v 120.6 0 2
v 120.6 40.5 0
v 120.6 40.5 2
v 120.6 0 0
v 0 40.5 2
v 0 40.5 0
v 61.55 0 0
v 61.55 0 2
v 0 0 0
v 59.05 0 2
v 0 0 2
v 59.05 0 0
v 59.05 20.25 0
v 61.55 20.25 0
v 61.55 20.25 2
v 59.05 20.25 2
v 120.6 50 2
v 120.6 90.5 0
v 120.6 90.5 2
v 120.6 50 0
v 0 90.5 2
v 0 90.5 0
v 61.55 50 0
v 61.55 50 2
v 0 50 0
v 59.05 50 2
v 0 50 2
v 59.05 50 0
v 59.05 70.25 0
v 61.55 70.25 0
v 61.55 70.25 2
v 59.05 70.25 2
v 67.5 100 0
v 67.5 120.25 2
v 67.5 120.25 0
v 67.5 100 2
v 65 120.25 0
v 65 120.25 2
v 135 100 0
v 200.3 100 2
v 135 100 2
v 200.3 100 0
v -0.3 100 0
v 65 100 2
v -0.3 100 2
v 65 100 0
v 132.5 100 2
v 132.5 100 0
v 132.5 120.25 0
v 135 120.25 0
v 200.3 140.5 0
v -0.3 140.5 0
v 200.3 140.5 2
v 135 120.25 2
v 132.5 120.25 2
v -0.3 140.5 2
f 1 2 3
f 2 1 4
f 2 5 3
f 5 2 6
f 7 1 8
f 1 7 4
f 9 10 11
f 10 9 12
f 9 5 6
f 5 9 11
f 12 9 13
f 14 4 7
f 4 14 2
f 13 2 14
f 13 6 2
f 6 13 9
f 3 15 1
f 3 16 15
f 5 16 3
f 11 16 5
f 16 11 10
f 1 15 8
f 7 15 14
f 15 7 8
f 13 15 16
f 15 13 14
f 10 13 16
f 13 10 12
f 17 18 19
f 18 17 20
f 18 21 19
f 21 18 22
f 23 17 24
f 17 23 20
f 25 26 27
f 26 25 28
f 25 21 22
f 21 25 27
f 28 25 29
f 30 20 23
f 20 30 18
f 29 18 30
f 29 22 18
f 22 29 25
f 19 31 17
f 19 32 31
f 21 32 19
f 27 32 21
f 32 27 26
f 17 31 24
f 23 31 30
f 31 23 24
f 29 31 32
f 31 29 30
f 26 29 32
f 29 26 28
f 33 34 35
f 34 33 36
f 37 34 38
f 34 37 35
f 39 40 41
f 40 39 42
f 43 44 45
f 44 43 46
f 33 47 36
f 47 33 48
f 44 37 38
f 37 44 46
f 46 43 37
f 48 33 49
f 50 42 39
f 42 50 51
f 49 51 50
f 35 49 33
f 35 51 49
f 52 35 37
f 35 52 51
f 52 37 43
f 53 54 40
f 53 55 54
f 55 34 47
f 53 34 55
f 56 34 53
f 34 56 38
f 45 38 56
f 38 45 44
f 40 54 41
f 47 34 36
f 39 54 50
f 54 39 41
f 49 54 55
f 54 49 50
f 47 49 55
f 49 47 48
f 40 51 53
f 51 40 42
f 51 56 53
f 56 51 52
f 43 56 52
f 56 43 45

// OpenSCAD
// file: lib/roundedcube_simple.scad
module roundedcube_simple(size = [1, 1, 1], center = false, radius = 0.5) {
    $fs=0.1;
	// If single value, convert to [x, y, z] vector
	size = (size[0] == undef) ? [size, size, size] : size;

	translate = (center == false) ?
		[radius, radius, radius] :
		[
			radius - (size[0] / 2),
			radius - (size[1] / 2),
			radius - (size[2] / 2)
	];

	translate(v = translate)
	minkowski() {
		cube(size = [
			size[0] - (radius * 2),
			size[1] - (radius * 2),
			size[2] - (radius * 2)
		]);
		sphere(r = radius);
	}
}
// file: lib/create_dividers.scad
// Creates the dividers for the above.
// Again the container_size provided is the internal dimensions.

function calculate_compartment_width(length, cutout_width, num)
    = (length - (num * cutout_width)) / (num+1);
    
function calculate_cutout_offset(compartment_width, cutout_width, i, padding = 0.0)
    = (compartment_width*i) + ((i-1)*cutout_width) + padding;

module create_divider(divider_length = 1.0, divider_width = 2.0, divider_height = 2.0, num = 1)
{
    difference() {
        cube([divider_length + 0.6, divider_width, divider_height + 0.5]);
        cutout_width = divider_width + 0.5;
        compartment_width = calculate_compartment_width(divider_length, cutout_width, num);
        for (i=[1:1:num]) {
            divisor_offset = calculate_cutout_offset(compartment_width, cutout_width, i, 0.3);
            translate([divisor_offset, 0, 0])
                cube([cutout_width, divider_width, (divider_height/2) + 0.25]);
        }
    }
}

module create_dividers(container_size = [1,1,1], divider_width = 2.0, num_horizontal = 2, num_vertical = 1)
{
    for (i=[1:1:num_horizontal]) {
        translate([0,((i-1) * container_size[2]) + ((i-1)*10),divider_width])
            rotate([-90,0,0])
                create_divider(container_size[0], divider_width, container_size[2], num_vertical);        
    }
    for (i=[1:1:num_vertical]) {
        translate([-0.3, ((num_horizontal + (i-1)) * container_size[2]) + ((num_horizontal + (i-1)) * 10), divider_width])
            rotate([-90,0,0])
                create_divider(container_size[1], divider_width, container_size[2], num_horizontal);

    }
}
// file: lib/create_tray.scad
use <roundedcube_simple.scad>
use <create_dividers.scad>

module create_tray(size = [1,1,1], wall = 3.5, base = 3.2, center = false, radius = 0.5) {
    x = size[0];
    y = size[1];
    z = size[2];
    difference() {
        difference() {
            translate([(x/2)+wall,(y/2)+wall,(z/2)+wall])
                roundedcube_simple([x+(wall*2),y+(wall*2),z+(base*2)],true,radius);
            translate([wall,wall,base])
                roundedcube_simple([x,y,z+base],false,3.0);
        }
        translate([-1,0,z+wall])
            cube([x+(wall*2)+2,y+(wall*2)+2,z+base]);
    }   
}

// Removes small circles to slot magnets into from the corners.  magnet size is diameter not radius.
module add_magnet_holes(container_size = [1,1,1], magnet_size = [1,1], inset = 1, fudge = 0.0) {
    // Force render resolution high for these and there's likely not much tolerance.  Even at 3.5mm some came out <2mm in a couple of orientations around the hole..
    $fs=0.1;
    br=magnet_size[0]/2;
    bh=magnet_size[1];
    // Bottom LEft
    translate([inset+br,inset+br, container_size[2] - magnet_size[1] + fudge])
        color("pink") cylinder(h=bh, r=br, center=false);
    // Bottom right
    translate([container_size[0]-br-inset,inset+br, container_size[2] - magnet_size[1] + fudge])
        color("pink") cylinder(h=bh, r=br, center=false);
    // Top Left
    translate([inset+br,container_size[1]-br-inset, container_size[2] - magnet_size[1] + fudge])
        color("pink") cylinder(h=bh, r=br, center=false);
    // Top Right
    translate([container_size[0]-br-inset,container_size[1]-br-inset, container_size[2] - magnet_size[1] + fudge])
        color("pink") cylinder(h=bh, r=br, center=false);
}

// Cuts slots into the tray for the dividers, with a 0.5mm tolerence added.
module create_divider_insets(container_size = [1,1,1], wall_width = 1.0, base_height = 1.0, divider_width = 2.0, num_horizontal = 1.0, num_vertical = 1.0) {
    cutout_width = divider_width + 0.5;
    short_divider_compartment_length = calculate_compartment_width(container_size[1], cutout_width, num_horizontal);
    
    for (i=[1:1:num_horizontal]) {
        short_divider_offset = calculate_cutout_offset(short_divider_compartment_length, cutout_width, i);
        translate([wall_width - 0.5, short_divider_offset + wall_width, base_height - 0.5])
        cube([container_size[0] + 1.0, divider_width + 0.5, container_size[2] + 1.0]);
    }
    
    long_divider_compartment_length = calculate_compartment_width(container_size[0], cutout_width, num_vertical);
    for (i=[1:1:num_vertical]) {
        long_divider_offset = calculate_cutout_offset(long_divider_compartment_length, cutout_width, i);
        translate([long_divider_offset + wall_width, wall_width - 0.5, base_height - 0.5])
        cube([divider_width + 0.5, container_size[1] + 1.0, container_size[2] + 1.0]);
    }
}
// file: tray_vars.scad
// These two values set the accuracy of the rendered output.  The below takes a while
// but is more than good enough for FDM printers.
$fa=1;
$fs=0.2;

// $fa = 1 render time 2m 1s 006
// $fa = 2 render time 1m 48s 067

fudge= $preview ? 0.01 : 0;

tray_internal_width = 120;
tray_internal_length = 200;
tray_internal_height = 40;

tray_divider_width = 2.0;

tray_vertical_dividers = 1;
tray_horizontal_dividers = 2;

tray_corner_radius = 3.0;

tray_wall_width = 3.6;
tray_base_height = 3.2;

tray_lid_height = tray_wall_width + tray_base_height;

// Add 0.5 to width and layer_height to height.
magnet_width = 3.5;
magnet_height = 2.2;
magnet_inset = 1.0;
// main file
include <tray_vars.scad>

use <lib/create_tray.scad>
use <lib/create_dividers.scad>
   
// Creates the dividers
create_dividers([tray_internal_width, tray_internal_length, tray_internal_height], tray_divider_width, tray_horizontal_dividers, tray_vertical_dividers);
